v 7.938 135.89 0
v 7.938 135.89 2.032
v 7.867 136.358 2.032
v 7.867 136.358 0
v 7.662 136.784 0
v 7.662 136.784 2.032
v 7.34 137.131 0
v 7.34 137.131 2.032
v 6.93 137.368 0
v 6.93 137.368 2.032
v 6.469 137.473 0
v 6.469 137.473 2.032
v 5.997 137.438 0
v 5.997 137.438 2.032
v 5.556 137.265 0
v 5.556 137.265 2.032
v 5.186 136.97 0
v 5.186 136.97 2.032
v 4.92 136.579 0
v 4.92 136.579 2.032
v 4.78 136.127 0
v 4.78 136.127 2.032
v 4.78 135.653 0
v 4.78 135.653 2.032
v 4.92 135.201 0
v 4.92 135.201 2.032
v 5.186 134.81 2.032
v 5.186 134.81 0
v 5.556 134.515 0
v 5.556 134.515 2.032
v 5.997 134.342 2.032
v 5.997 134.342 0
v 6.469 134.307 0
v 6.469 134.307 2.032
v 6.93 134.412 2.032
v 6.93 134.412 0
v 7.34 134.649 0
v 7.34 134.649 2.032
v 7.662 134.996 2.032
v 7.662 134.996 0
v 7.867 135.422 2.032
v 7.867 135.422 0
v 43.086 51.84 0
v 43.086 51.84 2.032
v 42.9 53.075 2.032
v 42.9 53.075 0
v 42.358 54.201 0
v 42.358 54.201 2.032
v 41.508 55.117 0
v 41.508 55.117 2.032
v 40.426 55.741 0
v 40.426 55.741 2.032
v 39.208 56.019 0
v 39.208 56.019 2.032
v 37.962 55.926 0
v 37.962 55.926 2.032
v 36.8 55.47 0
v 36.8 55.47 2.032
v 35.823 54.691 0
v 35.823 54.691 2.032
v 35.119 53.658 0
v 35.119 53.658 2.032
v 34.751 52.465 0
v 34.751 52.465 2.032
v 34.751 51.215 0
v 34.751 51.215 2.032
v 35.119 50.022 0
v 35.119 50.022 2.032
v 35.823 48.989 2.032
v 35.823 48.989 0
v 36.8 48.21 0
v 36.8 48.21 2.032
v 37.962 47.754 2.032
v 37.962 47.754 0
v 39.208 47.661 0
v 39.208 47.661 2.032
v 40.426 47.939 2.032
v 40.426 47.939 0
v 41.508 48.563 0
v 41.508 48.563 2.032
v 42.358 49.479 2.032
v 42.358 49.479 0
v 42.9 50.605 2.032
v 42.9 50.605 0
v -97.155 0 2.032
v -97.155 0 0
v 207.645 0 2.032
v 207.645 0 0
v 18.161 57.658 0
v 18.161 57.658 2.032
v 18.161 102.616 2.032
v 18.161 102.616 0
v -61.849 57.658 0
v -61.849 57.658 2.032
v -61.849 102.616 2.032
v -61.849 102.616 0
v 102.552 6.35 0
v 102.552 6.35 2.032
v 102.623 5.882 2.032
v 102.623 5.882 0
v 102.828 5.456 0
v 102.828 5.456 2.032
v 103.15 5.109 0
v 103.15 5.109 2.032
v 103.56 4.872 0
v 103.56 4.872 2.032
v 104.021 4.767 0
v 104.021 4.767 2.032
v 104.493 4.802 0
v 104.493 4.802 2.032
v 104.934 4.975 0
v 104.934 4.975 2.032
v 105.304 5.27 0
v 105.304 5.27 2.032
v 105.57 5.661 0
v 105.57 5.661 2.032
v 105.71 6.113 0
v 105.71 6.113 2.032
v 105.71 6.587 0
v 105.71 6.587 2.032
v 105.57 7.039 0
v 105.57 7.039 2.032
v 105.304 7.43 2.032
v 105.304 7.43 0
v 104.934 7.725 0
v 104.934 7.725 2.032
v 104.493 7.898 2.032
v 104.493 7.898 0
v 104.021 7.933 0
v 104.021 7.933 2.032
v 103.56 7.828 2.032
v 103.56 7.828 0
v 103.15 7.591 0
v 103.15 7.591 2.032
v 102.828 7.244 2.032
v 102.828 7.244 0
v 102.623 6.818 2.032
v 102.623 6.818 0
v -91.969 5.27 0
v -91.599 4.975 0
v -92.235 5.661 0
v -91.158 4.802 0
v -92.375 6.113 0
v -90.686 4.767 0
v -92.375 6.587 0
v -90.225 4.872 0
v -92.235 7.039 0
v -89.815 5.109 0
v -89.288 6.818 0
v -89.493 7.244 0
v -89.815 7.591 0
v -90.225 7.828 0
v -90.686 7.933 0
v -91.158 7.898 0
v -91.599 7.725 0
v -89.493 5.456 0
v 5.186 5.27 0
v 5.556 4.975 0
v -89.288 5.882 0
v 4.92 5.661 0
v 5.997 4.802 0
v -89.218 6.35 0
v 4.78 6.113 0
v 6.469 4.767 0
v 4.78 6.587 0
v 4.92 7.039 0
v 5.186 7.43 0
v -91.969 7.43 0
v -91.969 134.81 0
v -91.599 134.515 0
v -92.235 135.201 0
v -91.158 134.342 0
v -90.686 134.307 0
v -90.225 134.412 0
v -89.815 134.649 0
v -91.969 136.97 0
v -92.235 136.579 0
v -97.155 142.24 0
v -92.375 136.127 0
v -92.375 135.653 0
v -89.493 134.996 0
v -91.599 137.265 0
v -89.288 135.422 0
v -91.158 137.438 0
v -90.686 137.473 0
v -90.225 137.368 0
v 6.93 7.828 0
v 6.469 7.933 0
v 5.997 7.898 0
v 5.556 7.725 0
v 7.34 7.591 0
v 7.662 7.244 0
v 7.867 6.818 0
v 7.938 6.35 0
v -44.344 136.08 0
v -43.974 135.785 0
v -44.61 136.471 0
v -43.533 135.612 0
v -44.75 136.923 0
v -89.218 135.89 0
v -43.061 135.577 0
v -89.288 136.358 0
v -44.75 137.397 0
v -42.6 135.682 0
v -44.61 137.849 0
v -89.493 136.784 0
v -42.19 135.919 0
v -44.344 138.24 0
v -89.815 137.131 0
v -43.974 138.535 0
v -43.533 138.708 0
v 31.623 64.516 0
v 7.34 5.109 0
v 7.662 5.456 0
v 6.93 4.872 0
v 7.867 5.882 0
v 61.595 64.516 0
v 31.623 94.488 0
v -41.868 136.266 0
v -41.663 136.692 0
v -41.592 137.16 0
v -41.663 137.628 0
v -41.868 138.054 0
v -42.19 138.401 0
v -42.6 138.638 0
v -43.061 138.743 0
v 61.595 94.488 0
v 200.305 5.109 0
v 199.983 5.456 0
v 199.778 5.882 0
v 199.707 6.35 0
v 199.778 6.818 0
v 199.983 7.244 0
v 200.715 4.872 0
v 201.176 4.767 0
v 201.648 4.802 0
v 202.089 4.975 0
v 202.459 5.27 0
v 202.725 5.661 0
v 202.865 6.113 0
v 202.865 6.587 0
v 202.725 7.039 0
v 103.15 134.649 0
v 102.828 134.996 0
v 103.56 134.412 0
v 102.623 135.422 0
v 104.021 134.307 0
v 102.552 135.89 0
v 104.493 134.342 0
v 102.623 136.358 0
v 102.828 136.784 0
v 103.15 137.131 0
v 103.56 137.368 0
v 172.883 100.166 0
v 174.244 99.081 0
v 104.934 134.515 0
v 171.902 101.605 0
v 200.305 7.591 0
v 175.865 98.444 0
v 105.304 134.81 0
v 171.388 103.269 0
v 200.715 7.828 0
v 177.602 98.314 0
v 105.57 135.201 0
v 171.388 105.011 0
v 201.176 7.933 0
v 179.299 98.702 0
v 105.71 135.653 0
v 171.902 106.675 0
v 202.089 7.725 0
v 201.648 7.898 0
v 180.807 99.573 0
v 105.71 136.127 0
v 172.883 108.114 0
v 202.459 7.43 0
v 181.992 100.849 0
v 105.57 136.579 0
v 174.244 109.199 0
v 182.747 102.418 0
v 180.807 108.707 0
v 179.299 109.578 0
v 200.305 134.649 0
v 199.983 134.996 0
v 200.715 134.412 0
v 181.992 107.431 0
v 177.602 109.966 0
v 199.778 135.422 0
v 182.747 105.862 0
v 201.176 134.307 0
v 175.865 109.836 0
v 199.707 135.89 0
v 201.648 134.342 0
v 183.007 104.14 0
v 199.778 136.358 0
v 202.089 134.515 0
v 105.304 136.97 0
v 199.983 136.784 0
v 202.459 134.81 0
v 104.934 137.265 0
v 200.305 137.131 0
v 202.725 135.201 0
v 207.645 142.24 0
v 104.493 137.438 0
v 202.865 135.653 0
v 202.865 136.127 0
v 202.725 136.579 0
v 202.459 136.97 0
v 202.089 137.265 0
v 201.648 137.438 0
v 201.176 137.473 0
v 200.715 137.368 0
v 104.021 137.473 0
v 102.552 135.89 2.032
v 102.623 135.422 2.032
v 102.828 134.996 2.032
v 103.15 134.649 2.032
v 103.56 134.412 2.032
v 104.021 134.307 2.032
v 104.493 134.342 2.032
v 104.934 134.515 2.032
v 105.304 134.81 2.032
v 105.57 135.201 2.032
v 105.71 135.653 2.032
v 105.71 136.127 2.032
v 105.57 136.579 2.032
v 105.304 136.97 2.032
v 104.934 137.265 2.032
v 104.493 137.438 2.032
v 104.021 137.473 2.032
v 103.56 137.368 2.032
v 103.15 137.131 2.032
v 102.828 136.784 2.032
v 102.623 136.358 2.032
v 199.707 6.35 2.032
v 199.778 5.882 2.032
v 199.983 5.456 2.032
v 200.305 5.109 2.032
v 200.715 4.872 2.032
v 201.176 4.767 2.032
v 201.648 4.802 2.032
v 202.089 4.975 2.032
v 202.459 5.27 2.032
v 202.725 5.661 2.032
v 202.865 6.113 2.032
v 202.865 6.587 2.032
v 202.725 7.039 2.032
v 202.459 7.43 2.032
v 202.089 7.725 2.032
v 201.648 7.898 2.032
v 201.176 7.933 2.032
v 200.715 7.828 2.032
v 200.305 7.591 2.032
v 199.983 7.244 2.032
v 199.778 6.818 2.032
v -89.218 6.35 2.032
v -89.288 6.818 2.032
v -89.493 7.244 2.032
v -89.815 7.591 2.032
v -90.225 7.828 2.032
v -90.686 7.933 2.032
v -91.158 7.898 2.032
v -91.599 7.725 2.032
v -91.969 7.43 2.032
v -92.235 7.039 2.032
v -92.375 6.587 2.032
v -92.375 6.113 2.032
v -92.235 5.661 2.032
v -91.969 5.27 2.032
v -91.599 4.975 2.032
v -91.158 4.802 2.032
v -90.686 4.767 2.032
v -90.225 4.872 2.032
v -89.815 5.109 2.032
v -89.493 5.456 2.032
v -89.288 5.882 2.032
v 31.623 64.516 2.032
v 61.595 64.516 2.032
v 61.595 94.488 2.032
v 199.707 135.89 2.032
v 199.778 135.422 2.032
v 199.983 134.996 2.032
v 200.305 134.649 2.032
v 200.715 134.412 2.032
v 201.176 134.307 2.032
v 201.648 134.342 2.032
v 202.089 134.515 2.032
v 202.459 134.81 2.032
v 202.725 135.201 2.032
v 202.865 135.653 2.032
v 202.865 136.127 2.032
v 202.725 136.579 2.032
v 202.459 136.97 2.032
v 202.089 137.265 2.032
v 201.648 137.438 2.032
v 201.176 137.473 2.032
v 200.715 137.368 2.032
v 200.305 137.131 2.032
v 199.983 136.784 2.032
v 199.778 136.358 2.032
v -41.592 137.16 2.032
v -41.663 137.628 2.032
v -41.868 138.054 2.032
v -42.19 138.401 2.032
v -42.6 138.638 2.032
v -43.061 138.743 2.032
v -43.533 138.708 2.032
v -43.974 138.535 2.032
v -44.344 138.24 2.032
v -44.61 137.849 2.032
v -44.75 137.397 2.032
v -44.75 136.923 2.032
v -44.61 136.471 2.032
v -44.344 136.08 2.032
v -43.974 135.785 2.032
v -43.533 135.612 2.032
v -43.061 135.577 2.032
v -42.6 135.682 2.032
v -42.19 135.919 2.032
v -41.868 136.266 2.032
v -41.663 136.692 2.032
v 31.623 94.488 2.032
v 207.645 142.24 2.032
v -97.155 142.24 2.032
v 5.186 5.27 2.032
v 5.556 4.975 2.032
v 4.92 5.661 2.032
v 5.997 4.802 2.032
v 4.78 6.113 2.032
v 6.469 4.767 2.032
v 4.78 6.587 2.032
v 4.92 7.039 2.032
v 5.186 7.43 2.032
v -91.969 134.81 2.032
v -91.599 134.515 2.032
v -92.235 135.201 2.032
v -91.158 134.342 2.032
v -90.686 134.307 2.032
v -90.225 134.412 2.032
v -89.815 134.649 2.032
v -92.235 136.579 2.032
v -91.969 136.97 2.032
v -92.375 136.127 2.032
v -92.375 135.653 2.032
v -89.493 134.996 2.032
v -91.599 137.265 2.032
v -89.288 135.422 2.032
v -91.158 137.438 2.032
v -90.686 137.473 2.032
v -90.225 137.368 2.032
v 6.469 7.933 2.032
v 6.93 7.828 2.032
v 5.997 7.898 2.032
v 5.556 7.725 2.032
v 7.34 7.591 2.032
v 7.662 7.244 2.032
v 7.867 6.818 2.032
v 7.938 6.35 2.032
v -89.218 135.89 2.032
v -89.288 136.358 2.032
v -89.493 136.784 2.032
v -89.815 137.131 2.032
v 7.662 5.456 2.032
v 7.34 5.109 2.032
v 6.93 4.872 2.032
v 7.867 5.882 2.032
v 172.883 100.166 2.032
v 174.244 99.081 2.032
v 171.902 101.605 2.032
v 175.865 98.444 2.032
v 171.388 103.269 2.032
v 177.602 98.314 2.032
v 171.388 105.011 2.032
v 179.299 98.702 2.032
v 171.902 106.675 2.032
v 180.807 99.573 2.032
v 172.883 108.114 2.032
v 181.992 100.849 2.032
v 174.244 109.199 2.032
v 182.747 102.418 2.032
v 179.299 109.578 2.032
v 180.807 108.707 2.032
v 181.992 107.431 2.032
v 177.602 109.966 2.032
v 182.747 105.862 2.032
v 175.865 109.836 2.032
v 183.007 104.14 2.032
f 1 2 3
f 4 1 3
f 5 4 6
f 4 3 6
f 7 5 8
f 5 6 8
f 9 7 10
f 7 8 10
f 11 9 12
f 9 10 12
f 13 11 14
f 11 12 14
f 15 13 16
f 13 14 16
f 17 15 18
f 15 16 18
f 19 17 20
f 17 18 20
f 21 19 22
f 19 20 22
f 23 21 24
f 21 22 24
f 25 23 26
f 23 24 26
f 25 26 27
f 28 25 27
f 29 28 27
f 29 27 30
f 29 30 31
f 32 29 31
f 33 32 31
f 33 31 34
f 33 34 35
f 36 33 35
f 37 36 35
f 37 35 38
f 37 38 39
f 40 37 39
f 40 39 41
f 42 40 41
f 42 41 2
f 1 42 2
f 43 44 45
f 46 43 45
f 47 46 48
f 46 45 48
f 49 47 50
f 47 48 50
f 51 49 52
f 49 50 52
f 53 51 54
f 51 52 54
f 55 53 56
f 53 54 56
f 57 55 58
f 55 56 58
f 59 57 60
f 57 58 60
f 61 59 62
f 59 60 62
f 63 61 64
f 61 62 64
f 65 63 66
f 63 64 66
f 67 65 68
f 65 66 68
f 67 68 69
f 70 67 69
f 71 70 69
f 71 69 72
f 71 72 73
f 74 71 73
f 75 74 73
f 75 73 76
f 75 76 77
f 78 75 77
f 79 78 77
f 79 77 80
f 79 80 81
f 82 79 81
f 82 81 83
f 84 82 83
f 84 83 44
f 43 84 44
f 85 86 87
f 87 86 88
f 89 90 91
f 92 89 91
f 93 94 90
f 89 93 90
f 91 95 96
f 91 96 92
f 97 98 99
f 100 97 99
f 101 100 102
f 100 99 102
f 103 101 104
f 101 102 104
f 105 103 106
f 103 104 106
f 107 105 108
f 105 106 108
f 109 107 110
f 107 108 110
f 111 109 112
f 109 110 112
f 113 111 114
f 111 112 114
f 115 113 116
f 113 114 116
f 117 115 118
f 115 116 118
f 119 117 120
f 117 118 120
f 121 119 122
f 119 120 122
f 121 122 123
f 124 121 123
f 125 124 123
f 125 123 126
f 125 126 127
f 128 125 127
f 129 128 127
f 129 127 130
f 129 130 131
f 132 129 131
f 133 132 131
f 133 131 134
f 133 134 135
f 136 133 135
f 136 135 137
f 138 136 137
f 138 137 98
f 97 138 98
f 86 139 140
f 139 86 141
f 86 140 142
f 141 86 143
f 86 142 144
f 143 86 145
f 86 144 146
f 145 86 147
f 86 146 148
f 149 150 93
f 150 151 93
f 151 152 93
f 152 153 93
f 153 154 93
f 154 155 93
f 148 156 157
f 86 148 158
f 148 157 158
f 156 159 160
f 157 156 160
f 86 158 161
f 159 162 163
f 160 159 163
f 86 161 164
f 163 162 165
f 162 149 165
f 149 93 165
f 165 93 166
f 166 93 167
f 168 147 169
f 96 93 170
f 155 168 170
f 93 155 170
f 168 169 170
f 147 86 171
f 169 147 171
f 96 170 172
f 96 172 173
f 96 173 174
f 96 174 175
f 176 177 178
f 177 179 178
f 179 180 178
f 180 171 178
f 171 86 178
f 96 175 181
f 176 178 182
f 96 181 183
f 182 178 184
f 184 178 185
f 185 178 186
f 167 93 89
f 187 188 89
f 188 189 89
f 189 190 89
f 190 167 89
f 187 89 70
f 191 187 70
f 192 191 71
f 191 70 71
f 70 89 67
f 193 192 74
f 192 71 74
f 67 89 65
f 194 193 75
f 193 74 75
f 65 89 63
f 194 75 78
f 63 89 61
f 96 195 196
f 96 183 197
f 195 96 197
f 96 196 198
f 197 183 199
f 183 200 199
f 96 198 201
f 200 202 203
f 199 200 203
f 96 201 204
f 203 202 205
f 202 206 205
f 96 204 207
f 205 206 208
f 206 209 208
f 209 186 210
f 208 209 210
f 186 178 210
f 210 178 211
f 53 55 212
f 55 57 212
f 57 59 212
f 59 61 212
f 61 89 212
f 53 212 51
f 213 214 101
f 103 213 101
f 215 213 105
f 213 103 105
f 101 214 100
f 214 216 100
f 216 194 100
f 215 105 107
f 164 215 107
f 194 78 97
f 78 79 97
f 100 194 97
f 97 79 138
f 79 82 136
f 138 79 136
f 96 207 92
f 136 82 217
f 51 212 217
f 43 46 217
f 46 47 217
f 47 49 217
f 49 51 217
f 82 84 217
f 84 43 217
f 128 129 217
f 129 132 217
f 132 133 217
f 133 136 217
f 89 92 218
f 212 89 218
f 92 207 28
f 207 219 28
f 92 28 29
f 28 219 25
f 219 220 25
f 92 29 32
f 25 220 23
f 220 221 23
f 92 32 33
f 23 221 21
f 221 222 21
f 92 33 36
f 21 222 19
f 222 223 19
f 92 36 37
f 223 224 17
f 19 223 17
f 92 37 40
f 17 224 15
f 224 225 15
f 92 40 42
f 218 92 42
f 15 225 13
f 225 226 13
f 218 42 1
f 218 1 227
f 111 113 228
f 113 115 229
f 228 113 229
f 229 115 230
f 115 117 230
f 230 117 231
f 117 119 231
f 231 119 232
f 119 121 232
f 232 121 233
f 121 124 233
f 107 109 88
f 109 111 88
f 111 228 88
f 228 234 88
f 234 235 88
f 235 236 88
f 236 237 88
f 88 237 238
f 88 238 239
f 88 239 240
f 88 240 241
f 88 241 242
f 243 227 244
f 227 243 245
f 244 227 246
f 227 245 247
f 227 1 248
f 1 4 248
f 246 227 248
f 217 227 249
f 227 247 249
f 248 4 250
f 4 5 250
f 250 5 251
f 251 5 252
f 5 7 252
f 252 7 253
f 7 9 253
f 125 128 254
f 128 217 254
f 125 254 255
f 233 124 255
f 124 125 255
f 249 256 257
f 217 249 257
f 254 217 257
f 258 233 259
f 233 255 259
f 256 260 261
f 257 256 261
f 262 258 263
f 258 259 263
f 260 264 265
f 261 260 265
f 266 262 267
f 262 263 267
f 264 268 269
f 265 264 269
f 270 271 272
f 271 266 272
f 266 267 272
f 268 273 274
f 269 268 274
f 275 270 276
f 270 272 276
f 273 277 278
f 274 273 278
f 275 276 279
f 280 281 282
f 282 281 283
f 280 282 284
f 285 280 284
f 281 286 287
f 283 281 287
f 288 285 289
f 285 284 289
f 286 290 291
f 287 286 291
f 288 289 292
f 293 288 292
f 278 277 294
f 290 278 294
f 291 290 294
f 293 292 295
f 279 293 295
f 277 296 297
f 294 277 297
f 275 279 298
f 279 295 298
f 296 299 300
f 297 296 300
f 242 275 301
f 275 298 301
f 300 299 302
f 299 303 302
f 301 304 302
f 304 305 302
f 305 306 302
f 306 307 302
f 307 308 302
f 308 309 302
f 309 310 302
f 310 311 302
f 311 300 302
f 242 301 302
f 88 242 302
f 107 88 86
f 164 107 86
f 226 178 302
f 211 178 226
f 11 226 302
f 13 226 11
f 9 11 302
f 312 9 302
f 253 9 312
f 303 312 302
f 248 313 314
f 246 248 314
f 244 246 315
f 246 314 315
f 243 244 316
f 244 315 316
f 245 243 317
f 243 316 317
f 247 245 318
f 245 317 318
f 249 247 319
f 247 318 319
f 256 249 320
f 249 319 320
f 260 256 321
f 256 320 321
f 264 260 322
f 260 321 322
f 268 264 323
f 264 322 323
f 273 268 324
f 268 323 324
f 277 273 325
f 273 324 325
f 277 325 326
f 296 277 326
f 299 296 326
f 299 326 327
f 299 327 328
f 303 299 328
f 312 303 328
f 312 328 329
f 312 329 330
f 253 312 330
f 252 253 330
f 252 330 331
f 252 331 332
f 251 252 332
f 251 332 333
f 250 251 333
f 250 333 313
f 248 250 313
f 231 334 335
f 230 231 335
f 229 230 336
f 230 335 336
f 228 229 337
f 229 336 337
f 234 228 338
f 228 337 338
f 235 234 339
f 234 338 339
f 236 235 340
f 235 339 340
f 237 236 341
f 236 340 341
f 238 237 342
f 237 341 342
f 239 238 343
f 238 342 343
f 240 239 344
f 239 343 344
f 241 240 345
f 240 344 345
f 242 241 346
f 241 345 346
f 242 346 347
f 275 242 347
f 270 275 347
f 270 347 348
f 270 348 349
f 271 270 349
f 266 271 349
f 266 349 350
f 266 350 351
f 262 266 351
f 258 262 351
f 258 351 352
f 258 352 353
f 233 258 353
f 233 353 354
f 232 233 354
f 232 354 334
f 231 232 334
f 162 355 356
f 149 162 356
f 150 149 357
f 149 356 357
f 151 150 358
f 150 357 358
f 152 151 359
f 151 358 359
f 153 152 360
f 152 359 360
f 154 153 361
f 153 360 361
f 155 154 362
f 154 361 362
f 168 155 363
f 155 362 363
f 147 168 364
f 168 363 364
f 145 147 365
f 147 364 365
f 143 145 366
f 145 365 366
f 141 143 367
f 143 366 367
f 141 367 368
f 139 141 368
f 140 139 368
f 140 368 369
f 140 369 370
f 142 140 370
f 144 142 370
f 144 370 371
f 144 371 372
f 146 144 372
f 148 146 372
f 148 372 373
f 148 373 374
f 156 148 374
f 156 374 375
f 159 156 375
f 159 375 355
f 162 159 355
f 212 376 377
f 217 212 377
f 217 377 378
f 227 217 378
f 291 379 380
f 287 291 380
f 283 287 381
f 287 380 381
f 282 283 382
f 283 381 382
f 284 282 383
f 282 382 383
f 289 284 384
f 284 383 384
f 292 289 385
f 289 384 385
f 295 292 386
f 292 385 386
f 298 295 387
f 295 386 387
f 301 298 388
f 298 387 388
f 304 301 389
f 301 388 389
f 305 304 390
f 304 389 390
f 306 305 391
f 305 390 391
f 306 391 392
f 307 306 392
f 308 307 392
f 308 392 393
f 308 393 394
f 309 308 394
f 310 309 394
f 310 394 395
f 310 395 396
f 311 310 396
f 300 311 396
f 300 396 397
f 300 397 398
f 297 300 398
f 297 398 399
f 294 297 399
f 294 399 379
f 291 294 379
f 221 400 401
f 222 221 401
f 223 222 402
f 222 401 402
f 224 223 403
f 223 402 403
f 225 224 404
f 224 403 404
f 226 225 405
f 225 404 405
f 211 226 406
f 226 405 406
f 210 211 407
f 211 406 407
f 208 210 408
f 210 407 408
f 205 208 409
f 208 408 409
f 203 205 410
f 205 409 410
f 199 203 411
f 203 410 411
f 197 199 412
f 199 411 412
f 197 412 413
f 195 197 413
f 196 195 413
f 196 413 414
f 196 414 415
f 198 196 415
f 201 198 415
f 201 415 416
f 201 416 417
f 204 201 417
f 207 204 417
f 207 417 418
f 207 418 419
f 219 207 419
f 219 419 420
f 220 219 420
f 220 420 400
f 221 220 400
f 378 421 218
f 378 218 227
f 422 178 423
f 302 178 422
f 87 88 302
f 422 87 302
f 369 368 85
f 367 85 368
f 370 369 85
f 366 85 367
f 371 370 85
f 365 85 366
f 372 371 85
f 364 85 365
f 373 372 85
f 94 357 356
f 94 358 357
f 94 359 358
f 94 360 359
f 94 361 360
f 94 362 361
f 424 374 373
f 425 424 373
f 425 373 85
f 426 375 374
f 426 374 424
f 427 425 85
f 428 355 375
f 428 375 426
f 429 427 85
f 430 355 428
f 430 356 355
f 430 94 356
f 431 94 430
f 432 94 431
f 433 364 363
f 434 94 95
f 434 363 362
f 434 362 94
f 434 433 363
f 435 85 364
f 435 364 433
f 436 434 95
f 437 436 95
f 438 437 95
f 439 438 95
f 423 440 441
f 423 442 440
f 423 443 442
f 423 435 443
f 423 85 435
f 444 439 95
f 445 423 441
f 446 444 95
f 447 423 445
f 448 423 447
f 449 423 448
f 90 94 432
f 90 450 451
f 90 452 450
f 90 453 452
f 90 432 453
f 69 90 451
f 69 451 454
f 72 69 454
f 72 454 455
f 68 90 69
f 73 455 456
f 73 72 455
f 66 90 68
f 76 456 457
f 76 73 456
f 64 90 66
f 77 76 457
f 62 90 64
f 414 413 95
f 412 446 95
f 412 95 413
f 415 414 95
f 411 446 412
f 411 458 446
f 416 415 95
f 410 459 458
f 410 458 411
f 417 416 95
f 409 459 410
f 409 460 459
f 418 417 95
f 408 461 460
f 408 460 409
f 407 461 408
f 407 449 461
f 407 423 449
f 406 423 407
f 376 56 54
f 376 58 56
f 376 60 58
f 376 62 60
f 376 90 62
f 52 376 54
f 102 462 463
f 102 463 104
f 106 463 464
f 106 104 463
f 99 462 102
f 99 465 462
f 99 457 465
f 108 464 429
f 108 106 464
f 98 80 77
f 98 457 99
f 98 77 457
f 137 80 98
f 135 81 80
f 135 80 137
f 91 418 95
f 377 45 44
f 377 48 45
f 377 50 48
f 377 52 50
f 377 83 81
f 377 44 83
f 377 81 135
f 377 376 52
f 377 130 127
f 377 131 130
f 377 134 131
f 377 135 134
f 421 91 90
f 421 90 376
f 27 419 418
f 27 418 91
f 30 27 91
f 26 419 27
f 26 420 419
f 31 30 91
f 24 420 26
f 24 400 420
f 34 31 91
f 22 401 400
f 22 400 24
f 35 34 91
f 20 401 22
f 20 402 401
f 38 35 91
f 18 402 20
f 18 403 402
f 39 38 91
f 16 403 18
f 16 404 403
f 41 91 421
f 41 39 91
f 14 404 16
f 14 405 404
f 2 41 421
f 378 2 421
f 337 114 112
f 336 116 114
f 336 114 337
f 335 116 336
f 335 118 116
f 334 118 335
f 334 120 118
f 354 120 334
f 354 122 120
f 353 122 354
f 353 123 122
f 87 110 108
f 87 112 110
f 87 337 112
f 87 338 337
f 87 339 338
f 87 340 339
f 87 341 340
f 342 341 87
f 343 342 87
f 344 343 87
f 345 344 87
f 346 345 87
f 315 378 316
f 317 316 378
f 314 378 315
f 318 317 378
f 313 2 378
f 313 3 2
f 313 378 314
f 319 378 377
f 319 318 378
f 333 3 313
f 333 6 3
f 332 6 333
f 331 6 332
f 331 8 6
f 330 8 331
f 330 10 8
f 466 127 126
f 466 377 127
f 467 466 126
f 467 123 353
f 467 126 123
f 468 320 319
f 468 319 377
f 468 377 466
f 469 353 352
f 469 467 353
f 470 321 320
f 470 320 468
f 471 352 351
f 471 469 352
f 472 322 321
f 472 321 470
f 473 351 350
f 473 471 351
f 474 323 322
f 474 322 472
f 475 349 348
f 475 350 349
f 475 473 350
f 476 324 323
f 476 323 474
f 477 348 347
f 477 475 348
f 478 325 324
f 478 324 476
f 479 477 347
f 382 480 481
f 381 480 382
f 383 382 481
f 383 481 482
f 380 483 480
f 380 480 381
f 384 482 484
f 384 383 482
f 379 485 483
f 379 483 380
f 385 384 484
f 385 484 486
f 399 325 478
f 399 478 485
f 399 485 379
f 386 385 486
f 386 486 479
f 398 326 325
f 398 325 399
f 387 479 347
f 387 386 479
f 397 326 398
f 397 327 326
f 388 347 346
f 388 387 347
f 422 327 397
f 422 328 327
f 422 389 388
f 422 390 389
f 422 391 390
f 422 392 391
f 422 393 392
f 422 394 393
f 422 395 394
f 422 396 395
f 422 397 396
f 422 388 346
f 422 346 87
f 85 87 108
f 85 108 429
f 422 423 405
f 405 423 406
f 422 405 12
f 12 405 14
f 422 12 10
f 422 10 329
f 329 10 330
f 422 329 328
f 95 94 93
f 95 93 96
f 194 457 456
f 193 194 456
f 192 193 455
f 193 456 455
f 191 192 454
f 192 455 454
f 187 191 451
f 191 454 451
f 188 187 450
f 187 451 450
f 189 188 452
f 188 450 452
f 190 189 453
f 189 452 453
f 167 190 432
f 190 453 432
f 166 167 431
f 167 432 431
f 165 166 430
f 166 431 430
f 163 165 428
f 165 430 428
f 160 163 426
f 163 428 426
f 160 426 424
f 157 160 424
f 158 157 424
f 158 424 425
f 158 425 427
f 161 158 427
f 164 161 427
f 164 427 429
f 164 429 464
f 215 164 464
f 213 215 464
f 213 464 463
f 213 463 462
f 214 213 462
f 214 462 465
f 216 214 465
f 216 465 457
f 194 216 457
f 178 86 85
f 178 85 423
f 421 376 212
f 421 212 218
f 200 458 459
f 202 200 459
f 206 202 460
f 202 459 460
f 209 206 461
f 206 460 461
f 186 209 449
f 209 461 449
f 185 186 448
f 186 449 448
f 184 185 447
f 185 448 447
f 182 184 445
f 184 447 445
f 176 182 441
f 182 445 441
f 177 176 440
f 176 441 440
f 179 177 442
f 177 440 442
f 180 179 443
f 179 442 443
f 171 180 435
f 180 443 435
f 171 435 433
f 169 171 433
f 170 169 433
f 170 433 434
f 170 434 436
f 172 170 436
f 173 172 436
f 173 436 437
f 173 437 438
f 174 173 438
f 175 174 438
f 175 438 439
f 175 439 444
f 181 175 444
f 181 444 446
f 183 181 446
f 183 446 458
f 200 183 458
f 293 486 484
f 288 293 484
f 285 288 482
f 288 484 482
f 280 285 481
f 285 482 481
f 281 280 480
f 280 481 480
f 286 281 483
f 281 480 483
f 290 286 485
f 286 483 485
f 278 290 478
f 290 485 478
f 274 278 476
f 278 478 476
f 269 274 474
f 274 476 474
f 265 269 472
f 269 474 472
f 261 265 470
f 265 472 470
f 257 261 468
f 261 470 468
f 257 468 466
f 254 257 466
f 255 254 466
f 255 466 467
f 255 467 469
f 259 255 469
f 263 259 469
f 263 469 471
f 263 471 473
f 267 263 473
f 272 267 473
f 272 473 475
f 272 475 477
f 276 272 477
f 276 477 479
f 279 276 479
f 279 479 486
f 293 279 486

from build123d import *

# Parameters (mm, degrees)
SKETCH1_W          = 304.8
SKETCH1_H          = 142.24
EXTRUDE1_DEPTH     = 2.032
SKETCH3_R          = 1.5875
CUT_EXTRUDE1_DEPTH = 252.699806613
SKETCH4_R          = 4.191
SKETCH4_R_2        = 1.5875
SKETCH4_R_3        = 5.842
SKETCH4_W          = 80.01
SKETCH4_H          = 44.958
SKETCH4_W_2        = 29.972
SKETCH4_H_2        = 29.972
EXTRUDE2_DEPTH     = 252.699806613


with BuildPart() as part:
    # Sketch1 → Extrude1 (new body)
    with BuildSketch(Plane.XY):
        with Locations((55.245, 71.12)):
            Rectangle(SKETCH1_W, SKETCH1_H)
    extrude(amount=EXTRUDE1_DEPTH)

    # Sketch3 → Cut-Extrude1 (cut, through all)
    with BuildSketch(Plane.XY.offset(2.032)):
        with Locations((-90.805, 135.89)):
            Circle(SKETCH3_R)
        with Locations((-90.805, 6.35)):
            Circle(SKETCH3_R)
        with Locations((6.35, 135.89)):
            Circle(SKETCH3_R)
        with Locations((6.35, 6.35)):
            Circle(SKETCH3_R)
        with Locations(Location((104.14, 6.35, 0), (0, 0, 180))):
            Circle(SKETCH3_R)
        with Locations(Location((104.14, 135.89, 0), (0, 0, 180))):
            Circle(SKETCH3_R)
        with Locations(Location((201.295, 6.35, 0), (0, 0, 180))):
            Circle(SKETCH3_R)
        with Locations(Location((201.295, 135.89, 0), (0, 0, 180))):
            Circle(SKETCH3_R)
    extrude(amount=-CUT_EXTRUDE1_DEPTH, mode=Mode.SUBTRACT)

    # Sketch4 → Extrude2 (cut, through all)
    with BuildSketch(Plane.XY.offset(2.032)):
        with Locations((38.895, 51.84)):
            Circle(SKETCH4_R)
        with Locations((-43.18, 137.16)):
            Circle(SKETCH4_R_2)
        with Locations((177.165, 104.14)):
            Circle(SKETCH4_R_3)
        with Locations((-21.844, 80.137)):
            Rectangle(SKETCH4_W, SKETCH4_H)
        with Locations((46.609, 79.502)):
            Rectangle(SKETCH4_W_2, SKETCH4_H_2)
    extrude(amount=-EXTRUDE2_DEPTH, mode=Mode.SUBTRACT)


solid = part.part
